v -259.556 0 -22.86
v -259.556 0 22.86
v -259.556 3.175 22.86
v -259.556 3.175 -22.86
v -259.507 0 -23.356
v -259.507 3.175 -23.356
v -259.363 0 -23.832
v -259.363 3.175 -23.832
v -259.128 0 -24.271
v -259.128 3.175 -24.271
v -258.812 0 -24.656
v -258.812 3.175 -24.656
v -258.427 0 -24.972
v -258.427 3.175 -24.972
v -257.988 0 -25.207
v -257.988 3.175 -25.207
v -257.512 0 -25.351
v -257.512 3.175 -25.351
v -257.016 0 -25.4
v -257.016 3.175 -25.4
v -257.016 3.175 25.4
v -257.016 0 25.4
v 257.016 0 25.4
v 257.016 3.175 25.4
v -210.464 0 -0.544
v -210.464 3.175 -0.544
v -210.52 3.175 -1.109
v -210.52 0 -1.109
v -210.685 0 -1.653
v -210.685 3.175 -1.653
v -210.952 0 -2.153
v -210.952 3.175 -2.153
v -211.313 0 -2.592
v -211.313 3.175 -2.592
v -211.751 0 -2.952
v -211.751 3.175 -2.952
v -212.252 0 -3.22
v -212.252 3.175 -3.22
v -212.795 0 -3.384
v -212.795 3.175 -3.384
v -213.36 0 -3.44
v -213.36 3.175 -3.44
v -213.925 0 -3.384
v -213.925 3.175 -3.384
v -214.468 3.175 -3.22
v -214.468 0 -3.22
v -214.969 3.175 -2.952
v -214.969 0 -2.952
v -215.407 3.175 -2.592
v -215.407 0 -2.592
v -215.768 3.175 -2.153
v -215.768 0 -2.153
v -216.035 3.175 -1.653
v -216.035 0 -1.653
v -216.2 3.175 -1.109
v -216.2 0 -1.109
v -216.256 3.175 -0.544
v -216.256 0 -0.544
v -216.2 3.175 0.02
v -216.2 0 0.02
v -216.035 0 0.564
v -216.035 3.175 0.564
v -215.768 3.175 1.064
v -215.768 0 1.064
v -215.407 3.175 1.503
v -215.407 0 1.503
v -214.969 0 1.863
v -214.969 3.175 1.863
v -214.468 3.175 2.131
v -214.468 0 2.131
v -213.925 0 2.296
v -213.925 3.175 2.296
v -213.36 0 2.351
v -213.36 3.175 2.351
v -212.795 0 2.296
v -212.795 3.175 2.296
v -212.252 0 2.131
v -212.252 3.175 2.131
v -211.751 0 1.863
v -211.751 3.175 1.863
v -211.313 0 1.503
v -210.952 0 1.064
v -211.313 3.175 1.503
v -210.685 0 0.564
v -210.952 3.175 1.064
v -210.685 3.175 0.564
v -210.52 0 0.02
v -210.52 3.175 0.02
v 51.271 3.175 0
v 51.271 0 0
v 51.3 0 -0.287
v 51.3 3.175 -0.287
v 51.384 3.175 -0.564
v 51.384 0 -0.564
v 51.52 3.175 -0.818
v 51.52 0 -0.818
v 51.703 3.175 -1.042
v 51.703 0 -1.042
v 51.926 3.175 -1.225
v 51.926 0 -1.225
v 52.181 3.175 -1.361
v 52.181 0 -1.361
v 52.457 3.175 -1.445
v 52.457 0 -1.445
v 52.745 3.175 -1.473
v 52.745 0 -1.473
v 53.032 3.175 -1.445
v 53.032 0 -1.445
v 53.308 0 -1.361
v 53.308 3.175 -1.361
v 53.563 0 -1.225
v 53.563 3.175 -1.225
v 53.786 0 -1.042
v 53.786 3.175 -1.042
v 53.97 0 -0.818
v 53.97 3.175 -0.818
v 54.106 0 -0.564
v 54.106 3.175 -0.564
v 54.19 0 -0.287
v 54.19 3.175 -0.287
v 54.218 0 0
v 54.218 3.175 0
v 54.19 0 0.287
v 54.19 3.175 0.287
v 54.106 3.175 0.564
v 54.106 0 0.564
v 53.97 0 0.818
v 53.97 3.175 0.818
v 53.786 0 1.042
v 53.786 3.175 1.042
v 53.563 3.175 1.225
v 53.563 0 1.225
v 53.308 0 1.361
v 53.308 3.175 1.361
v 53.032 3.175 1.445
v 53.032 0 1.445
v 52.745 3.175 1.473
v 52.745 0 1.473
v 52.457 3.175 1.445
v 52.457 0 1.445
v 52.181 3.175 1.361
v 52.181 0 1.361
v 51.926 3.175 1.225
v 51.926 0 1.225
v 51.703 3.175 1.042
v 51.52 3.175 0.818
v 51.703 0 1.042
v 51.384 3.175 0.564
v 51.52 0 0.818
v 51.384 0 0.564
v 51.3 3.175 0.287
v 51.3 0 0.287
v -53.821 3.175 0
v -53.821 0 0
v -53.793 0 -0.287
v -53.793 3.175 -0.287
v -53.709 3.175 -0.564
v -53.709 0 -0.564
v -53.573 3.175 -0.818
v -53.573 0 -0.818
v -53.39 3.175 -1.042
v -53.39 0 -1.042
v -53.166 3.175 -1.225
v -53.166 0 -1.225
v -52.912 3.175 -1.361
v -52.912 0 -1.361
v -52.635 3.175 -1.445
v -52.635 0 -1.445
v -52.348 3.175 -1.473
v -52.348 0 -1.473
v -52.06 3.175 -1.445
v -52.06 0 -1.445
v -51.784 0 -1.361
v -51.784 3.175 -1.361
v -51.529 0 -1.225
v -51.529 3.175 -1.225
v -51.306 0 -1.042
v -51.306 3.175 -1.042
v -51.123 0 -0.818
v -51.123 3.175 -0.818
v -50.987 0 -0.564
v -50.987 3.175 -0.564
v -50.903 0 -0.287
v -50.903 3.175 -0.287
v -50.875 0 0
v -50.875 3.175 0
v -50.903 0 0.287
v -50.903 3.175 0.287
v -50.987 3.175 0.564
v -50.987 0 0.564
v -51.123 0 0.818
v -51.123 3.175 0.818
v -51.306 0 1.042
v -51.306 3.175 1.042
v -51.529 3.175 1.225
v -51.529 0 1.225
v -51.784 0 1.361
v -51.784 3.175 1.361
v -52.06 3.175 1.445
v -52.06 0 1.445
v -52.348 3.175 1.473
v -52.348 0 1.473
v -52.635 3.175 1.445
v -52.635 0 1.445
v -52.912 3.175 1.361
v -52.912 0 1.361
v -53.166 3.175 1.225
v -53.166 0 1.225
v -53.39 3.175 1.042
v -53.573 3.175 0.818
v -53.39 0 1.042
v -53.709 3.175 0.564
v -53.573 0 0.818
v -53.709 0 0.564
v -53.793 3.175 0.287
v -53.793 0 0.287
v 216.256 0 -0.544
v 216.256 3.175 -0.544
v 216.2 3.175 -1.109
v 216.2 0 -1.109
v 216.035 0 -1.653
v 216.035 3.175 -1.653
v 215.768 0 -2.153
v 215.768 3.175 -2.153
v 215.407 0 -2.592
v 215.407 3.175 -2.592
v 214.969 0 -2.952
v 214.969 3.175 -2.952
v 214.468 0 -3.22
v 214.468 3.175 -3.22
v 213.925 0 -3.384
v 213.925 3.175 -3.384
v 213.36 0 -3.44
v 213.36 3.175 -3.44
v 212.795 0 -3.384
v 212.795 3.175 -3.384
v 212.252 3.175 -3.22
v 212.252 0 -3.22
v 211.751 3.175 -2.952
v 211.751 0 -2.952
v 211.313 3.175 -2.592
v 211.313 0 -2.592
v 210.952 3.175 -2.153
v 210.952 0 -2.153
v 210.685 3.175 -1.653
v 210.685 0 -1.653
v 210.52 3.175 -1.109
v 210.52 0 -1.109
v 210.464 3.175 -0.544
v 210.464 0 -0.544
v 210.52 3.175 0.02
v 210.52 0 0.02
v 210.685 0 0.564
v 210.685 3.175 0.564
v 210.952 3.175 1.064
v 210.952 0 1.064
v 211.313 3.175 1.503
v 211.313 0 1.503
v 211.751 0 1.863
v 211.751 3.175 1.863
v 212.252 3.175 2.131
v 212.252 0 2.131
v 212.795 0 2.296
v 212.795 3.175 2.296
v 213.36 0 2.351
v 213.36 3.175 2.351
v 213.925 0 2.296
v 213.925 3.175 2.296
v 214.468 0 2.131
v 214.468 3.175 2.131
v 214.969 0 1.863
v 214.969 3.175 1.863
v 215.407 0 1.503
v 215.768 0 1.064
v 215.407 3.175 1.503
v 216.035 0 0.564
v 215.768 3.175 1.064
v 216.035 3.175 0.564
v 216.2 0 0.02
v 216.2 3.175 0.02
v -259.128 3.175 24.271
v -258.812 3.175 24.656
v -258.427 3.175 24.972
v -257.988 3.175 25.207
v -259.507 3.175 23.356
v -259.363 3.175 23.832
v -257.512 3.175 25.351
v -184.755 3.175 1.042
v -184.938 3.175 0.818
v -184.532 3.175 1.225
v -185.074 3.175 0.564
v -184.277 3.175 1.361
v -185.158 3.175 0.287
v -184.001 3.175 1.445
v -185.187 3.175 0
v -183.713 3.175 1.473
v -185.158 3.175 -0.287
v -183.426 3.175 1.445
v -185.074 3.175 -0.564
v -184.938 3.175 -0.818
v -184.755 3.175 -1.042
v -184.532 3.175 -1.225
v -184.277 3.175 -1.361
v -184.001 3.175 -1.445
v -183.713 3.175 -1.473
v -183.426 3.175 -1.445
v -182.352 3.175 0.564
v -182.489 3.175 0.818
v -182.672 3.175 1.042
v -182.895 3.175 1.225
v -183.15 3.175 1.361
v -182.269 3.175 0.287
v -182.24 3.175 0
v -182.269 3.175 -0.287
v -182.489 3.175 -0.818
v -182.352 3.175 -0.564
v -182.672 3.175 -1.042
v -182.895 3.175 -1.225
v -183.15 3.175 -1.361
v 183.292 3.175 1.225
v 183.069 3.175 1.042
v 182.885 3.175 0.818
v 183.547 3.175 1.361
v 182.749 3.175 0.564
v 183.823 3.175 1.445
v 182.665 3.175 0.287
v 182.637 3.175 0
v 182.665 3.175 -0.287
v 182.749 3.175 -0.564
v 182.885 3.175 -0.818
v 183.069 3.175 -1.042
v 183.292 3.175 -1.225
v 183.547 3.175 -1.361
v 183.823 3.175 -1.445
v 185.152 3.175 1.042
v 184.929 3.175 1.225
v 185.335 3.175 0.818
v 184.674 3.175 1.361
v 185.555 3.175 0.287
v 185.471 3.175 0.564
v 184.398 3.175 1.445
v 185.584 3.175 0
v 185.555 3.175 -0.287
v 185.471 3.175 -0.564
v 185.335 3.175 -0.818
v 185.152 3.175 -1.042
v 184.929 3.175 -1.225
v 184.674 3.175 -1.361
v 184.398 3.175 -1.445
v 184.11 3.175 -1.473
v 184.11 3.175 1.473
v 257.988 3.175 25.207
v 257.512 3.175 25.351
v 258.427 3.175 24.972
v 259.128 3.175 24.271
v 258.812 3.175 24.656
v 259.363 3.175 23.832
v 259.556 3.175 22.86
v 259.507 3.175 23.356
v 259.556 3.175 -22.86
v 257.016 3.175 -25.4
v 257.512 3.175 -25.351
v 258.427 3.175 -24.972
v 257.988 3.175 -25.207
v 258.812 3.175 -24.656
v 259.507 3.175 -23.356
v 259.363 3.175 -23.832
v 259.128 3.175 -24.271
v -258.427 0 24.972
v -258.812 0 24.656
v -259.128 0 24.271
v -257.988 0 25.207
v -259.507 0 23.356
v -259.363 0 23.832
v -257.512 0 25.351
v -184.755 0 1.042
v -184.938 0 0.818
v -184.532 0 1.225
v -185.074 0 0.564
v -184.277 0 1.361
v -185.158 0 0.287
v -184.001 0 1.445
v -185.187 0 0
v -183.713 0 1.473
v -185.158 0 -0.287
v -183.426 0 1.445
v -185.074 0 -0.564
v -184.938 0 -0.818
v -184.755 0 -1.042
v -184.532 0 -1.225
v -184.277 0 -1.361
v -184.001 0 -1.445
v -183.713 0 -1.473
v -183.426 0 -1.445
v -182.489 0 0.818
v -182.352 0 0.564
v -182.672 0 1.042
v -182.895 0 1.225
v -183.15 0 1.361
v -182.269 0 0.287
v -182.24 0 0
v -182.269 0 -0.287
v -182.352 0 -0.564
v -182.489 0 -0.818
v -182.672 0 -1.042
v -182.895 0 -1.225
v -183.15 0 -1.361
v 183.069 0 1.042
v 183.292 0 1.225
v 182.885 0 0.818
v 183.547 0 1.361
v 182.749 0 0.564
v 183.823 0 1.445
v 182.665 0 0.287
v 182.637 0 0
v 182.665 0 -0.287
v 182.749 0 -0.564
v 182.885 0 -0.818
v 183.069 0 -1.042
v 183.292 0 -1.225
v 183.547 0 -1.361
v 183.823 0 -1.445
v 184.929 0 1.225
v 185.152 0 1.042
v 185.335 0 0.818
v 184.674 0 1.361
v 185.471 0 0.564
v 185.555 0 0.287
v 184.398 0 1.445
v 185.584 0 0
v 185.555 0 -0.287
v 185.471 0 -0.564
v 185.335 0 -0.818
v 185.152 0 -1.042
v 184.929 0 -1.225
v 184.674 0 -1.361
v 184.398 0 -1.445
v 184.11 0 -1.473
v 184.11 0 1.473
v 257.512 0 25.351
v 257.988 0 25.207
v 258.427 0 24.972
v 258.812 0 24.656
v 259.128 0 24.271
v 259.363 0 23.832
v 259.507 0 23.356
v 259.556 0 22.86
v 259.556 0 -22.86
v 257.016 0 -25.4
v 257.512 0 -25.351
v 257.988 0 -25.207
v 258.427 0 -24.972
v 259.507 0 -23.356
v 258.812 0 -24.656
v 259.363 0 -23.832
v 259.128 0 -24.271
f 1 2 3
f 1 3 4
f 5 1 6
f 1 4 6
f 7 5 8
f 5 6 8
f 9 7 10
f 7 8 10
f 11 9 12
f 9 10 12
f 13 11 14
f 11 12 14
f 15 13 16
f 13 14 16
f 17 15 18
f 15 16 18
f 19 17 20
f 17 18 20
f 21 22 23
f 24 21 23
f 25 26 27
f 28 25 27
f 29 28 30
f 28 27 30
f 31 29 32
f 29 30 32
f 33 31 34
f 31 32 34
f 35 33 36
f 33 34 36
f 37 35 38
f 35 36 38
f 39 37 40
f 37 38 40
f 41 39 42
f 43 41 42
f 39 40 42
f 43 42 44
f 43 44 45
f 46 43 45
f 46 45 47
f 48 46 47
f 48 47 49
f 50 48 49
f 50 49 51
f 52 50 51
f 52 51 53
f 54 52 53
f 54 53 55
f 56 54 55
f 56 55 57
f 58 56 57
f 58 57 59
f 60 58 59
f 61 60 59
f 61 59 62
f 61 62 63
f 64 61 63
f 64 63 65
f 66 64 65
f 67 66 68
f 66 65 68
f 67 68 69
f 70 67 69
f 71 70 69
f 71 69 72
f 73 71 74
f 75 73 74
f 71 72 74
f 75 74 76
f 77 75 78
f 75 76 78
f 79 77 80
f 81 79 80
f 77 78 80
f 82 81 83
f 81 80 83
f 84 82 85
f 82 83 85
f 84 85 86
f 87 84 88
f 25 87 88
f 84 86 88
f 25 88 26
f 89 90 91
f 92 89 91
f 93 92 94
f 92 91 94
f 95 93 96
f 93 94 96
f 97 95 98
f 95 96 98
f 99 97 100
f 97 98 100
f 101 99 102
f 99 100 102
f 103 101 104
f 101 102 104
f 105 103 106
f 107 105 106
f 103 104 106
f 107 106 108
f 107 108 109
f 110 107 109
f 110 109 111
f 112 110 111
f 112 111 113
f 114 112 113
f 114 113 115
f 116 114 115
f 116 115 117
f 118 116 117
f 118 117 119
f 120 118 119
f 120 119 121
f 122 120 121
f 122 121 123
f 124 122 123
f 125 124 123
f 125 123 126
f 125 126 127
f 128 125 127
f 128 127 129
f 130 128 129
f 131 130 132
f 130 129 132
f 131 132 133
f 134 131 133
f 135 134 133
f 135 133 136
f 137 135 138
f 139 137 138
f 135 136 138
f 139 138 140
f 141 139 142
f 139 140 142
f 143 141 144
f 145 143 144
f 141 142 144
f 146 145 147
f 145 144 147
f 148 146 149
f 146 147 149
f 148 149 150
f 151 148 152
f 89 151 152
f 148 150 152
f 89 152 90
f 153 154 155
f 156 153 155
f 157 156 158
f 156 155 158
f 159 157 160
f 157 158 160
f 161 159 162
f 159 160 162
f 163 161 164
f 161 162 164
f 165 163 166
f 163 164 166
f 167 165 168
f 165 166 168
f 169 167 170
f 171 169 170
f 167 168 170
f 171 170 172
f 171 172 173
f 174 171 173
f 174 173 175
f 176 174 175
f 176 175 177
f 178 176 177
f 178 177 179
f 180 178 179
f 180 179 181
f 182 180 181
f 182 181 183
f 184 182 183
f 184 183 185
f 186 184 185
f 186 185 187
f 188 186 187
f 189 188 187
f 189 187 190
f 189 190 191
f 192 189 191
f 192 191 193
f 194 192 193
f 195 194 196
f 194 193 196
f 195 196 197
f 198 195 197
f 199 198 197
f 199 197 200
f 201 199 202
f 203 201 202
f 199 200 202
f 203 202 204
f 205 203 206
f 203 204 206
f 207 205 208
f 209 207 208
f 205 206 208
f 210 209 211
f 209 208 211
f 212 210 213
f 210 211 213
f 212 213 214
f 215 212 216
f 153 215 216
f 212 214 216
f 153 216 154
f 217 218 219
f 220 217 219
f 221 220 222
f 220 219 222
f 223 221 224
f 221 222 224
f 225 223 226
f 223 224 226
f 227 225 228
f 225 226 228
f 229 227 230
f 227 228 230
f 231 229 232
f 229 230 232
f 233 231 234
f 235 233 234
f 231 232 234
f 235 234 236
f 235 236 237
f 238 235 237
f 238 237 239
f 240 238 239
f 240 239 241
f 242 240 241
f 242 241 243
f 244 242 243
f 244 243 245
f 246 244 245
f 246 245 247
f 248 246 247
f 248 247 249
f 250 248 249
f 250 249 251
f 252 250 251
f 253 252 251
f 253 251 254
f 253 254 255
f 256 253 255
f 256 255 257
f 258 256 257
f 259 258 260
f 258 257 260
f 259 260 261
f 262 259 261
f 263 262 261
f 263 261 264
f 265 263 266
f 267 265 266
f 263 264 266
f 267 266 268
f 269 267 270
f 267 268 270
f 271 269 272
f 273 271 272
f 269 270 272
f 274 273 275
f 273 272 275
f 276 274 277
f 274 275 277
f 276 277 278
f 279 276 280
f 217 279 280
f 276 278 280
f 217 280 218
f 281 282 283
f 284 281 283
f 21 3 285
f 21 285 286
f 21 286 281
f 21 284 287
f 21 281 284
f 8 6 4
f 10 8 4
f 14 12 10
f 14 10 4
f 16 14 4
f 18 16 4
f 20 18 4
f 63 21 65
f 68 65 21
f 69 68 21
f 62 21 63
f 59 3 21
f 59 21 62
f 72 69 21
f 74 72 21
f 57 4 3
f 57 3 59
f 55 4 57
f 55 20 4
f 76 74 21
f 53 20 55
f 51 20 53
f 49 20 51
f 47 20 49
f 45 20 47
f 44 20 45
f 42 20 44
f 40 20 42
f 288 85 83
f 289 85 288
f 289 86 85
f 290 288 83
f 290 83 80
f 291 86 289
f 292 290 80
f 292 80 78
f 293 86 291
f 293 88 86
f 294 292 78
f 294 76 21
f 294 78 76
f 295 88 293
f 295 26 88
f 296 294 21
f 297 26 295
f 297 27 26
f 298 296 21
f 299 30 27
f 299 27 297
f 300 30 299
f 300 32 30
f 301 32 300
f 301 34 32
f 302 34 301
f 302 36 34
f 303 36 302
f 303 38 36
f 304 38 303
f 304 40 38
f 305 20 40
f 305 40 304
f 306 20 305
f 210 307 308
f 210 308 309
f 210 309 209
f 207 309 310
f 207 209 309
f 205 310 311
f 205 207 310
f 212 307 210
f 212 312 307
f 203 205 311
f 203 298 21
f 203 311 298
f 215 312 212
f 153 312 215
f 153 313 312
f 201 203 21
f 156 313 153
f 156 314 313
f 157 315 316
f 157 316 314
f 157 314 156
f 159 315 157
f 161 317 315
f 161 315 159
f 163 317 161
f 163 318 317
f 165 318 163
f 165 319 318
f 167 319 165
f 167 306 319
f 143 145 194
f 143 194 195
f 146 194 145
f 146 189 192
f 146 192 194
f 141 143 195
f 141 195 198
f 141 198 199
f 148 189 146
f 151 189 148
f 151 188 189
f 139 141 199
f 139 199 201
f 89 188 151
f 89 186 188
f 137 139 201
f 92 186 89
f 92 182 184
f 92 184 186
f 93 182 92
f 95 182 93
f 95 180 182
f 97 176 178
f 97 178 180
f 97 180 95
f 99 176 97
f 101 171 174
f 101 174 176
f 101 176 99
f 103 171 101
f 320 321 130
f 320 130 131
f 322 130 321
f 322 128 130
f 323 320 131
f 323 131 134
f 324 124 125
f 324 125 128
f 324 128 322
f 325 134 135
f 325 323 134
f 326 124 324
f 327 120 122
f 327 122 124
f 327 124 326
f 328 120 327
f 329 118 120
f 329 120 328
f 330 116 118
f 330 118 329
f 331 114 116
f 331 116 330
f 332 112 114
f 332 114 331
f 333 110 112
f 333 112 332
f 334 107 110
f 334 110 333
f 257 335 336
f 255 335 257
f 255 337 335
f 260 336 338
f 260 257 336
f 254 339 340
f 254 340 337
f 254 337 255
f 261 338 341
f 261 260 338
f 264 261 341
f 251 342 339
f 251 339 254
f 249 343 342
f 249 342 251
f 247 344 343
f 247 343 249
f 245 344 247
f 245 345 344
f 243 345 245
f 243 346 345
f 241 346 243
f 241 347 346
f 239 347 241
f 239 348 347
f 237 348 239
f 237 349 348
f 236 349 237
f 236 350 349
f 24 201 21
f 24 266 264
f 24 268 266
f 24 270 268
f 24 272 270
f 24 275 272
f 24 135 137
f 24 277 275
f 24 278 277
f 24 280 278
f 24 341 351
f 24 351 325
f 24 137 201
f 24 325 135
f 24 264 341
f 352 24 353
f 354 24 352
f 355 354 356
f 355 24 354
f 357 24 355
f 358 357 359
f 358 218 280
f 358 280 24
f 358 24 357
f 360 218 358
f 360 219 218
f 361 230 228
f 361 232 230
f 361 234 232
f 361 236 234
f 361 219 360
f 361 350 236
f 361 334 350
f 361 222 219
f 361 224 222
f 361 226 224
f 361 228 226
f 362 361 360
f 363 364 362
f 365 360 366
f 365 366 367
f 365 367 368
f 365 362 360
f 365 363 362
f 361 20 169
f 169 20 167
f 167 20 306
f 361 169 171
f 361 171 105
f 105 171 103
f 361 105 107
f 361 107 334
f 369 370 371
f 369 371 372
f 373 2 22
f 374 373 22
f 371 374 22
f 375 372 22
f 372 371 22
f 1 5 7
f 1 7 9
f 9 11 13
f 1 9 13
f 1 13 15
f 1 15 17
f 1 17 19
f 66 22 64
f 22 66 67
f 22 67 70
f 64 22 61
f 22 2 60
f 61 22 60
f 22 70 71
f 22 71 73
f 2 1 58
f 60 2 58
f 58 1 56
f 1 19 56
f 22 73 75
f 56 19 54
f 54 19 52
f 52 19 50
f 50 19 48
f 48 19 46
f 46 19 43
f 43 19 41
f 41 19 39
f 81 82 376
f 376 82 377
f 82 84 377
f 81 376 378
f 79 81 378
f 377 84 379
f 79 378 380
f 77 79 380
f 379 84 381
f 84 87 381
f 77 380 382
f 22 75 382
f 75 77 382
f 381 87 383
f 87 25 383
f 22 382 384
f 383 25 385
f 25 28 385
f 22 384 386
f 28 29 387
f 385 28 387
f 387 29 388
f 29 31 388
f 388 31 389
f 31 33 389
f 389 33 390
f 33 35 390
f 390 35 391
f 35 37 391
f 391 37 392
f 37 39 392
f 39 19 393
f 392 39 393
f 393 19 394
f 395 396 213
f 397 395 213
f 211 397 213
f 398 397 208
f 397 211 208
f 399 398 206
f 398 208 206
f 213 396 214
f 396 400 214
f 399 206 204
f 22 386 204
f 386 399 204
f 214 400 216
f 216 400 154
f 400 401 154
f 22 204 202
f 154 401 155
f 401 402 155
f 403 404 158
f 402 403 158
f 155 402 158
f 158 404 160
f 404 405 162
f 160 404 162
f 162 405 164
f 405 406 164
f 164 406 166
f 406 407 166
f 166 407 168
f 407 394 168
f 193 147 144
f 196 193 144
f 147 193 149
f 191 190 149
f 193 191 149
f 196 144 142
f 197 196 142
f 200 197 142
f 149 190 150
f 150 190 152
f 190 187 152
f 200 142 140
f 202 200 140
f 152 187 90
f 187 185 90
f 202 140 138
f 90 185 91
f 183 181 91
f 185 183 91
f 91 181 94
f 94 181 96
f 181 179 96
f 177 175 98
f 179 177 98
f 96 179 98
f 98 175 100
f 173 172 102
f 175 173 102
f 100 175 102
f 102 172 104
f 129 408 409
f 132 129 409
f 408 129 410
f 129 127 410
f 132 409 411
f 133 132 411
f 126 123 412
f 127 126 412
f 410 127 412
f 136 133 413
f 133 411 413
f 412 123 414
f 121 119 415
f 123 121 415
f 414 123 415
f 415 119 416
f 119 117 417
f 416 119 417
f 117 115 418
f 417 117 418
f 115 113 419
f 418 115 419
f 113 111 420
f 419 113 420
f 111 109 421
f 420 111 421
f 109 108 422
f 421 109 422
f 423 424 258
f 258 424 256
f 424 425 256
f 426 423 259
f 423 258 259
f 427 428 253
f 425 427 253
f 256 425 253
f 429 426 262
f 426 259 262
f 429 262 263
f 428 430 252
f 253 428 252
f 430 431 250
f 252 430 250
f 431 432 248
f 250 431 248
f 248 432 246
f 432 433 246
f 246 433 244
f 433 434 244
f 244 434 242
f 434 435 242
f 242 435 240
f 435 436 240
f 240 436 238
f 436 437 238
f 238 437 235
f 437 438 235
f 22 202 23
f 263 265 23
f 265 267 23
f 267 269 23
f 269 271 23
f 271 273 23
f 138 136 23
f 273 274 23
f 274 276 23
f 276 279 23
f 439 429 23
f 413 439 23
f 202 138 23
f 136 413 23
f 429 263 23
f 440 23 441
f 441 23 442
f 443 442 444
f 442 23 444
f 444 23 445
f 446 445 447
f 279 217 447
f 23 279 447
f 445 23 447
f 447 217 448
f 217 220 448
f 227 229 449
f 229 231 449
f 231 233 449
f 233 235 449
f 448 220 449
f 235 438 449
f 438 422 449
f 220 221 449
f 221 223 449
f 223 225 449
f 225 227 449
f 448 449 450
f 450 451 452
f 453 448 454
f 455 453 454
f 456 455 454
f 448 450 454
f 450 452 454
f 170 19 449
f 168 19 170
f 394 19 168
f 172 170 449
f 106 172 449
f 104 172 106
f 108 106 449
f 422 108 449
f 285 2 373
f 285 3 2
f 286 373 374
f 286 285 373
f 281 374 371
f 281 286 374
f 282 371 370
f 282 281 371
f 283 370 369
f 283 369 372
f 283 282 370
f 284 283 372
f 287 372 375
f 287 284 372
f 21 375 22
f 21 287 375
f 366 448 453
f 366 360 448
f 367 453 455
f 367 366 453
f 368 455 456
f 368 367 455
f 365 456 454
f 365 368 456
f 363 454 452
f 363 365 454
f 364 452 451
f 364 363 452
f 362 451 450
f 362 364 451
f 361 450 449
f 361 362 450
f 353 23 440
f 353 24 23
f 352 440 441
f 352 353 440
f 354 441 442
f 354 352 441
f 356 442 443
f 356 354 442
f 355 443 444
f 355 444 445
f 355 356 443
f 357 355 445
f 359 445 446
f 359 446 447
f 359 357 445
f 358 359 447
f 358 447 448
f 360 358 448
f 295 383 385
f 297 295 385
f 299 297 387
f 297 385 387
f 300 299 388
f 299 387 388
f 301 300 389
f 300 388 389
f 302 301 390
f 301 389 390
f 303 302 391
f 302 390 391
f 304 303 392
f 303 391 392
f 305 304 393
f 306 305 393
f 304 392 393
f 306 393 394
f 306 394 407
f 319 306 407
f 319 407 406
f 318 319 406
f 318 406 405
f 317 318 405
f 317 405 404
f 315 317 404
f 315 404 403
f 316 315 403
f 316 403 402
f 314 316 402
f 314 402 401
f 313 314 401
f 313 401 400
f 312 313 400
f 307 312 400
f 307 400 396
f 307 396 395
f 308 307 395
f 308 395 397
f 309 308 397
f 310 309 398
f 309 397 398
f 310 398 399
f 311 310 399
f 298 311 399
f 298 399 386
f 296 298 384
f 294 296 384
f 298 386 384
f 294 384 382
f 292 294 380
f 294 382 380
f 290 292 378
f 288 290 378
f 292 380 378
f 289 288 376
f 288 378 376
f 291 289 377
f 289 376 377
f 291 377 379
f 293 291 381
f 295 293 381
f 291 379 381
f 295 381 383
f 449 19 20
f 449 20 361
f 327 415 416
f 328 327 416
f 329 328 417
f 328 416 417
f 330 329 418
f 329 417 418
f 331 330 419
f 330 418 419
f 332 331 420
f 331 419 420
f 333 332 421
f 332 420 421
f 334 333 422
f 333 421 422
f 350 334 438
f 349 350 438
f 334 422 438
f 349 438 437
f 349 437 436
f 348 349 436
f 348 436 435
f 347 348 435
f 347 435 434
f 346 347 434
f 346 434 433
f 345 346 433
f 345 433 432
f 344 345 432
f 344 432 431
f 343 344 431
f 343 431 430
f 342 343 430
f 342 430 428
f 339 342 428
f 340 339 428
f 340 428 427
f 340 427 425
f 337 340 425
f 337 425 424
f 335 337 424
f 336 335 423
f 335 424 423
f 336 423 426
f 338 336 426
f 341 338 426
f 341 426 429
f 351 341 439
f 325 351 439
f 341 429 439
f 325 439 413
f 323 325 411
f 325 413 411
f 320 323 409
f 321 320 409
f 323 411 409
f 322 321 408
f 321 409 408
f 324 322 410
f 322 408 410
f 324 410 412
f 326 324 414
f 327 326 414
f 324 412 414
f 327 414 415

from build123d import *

# Parameters (mm, degrees)
SKETCH1_W                  = 519.1125
SKETCH1_H                  = 50.8
BOSS_EXTRUDE1_DEPTH        = 3.175
FILLET1_R                  = 2.54
F_4_CLEARANCE_HOLE1_D      = 2.9464
F_1_0_228_DIAMETER_HOLE1_D = 5.7912


with BuildPart() as part:
    # Sketch1 → Boss-Extrude1 (new body)
    with BuildSketch(Plane(origin=(0, 0, 0), x_dir=(1, 0, 0), z_dir=(0, 1, 0))):
        Rectangle(SKETCH1_W, SKETCH1_H)
    extrude(amount=BOSS_EXTRUDE1_DEPTH)

    # Fillet1
    fillet1_edges = [part.edges().sort_by_distance(p)[0] for p in [
        (259.55625, 1.5875, 25.4),
        (-259.55625, 1.5875, 25.4),
        (-259.55625, 1.5875, -25.4),
        (259.55625, 1.5875, -25.4),
    ]]
    fillet(fillet1_edges, radius=FILLET1_R)

    # #4 Clearance Hole1 (through all)
    with Locations(Plane(origin=(0, 3.175, 0), x_dir=(1, 0, 0), z_dir=(0, 1, 0))):
        with Locations((184.1103125, 0), (52.7446875, 0), (-52.3478125, 0), (-183.7134375, 0)):
            Hole(F_4_CLEARANCE_HOLE1_D / 2)

    # #1 (0.228) Diameter Hole1 (through all)
    with Locations(Plane(origin=(0, 0, 0), x_dir=(-1, 0, 0), z_dir=(0, -1, 0))):
        with Locations((-213.36, 0.5444109), (213.36, 0.5444109)):
            Hole(F_1_0_228_DIAMETER_HOLE1_D / 2)


solid = part.part
